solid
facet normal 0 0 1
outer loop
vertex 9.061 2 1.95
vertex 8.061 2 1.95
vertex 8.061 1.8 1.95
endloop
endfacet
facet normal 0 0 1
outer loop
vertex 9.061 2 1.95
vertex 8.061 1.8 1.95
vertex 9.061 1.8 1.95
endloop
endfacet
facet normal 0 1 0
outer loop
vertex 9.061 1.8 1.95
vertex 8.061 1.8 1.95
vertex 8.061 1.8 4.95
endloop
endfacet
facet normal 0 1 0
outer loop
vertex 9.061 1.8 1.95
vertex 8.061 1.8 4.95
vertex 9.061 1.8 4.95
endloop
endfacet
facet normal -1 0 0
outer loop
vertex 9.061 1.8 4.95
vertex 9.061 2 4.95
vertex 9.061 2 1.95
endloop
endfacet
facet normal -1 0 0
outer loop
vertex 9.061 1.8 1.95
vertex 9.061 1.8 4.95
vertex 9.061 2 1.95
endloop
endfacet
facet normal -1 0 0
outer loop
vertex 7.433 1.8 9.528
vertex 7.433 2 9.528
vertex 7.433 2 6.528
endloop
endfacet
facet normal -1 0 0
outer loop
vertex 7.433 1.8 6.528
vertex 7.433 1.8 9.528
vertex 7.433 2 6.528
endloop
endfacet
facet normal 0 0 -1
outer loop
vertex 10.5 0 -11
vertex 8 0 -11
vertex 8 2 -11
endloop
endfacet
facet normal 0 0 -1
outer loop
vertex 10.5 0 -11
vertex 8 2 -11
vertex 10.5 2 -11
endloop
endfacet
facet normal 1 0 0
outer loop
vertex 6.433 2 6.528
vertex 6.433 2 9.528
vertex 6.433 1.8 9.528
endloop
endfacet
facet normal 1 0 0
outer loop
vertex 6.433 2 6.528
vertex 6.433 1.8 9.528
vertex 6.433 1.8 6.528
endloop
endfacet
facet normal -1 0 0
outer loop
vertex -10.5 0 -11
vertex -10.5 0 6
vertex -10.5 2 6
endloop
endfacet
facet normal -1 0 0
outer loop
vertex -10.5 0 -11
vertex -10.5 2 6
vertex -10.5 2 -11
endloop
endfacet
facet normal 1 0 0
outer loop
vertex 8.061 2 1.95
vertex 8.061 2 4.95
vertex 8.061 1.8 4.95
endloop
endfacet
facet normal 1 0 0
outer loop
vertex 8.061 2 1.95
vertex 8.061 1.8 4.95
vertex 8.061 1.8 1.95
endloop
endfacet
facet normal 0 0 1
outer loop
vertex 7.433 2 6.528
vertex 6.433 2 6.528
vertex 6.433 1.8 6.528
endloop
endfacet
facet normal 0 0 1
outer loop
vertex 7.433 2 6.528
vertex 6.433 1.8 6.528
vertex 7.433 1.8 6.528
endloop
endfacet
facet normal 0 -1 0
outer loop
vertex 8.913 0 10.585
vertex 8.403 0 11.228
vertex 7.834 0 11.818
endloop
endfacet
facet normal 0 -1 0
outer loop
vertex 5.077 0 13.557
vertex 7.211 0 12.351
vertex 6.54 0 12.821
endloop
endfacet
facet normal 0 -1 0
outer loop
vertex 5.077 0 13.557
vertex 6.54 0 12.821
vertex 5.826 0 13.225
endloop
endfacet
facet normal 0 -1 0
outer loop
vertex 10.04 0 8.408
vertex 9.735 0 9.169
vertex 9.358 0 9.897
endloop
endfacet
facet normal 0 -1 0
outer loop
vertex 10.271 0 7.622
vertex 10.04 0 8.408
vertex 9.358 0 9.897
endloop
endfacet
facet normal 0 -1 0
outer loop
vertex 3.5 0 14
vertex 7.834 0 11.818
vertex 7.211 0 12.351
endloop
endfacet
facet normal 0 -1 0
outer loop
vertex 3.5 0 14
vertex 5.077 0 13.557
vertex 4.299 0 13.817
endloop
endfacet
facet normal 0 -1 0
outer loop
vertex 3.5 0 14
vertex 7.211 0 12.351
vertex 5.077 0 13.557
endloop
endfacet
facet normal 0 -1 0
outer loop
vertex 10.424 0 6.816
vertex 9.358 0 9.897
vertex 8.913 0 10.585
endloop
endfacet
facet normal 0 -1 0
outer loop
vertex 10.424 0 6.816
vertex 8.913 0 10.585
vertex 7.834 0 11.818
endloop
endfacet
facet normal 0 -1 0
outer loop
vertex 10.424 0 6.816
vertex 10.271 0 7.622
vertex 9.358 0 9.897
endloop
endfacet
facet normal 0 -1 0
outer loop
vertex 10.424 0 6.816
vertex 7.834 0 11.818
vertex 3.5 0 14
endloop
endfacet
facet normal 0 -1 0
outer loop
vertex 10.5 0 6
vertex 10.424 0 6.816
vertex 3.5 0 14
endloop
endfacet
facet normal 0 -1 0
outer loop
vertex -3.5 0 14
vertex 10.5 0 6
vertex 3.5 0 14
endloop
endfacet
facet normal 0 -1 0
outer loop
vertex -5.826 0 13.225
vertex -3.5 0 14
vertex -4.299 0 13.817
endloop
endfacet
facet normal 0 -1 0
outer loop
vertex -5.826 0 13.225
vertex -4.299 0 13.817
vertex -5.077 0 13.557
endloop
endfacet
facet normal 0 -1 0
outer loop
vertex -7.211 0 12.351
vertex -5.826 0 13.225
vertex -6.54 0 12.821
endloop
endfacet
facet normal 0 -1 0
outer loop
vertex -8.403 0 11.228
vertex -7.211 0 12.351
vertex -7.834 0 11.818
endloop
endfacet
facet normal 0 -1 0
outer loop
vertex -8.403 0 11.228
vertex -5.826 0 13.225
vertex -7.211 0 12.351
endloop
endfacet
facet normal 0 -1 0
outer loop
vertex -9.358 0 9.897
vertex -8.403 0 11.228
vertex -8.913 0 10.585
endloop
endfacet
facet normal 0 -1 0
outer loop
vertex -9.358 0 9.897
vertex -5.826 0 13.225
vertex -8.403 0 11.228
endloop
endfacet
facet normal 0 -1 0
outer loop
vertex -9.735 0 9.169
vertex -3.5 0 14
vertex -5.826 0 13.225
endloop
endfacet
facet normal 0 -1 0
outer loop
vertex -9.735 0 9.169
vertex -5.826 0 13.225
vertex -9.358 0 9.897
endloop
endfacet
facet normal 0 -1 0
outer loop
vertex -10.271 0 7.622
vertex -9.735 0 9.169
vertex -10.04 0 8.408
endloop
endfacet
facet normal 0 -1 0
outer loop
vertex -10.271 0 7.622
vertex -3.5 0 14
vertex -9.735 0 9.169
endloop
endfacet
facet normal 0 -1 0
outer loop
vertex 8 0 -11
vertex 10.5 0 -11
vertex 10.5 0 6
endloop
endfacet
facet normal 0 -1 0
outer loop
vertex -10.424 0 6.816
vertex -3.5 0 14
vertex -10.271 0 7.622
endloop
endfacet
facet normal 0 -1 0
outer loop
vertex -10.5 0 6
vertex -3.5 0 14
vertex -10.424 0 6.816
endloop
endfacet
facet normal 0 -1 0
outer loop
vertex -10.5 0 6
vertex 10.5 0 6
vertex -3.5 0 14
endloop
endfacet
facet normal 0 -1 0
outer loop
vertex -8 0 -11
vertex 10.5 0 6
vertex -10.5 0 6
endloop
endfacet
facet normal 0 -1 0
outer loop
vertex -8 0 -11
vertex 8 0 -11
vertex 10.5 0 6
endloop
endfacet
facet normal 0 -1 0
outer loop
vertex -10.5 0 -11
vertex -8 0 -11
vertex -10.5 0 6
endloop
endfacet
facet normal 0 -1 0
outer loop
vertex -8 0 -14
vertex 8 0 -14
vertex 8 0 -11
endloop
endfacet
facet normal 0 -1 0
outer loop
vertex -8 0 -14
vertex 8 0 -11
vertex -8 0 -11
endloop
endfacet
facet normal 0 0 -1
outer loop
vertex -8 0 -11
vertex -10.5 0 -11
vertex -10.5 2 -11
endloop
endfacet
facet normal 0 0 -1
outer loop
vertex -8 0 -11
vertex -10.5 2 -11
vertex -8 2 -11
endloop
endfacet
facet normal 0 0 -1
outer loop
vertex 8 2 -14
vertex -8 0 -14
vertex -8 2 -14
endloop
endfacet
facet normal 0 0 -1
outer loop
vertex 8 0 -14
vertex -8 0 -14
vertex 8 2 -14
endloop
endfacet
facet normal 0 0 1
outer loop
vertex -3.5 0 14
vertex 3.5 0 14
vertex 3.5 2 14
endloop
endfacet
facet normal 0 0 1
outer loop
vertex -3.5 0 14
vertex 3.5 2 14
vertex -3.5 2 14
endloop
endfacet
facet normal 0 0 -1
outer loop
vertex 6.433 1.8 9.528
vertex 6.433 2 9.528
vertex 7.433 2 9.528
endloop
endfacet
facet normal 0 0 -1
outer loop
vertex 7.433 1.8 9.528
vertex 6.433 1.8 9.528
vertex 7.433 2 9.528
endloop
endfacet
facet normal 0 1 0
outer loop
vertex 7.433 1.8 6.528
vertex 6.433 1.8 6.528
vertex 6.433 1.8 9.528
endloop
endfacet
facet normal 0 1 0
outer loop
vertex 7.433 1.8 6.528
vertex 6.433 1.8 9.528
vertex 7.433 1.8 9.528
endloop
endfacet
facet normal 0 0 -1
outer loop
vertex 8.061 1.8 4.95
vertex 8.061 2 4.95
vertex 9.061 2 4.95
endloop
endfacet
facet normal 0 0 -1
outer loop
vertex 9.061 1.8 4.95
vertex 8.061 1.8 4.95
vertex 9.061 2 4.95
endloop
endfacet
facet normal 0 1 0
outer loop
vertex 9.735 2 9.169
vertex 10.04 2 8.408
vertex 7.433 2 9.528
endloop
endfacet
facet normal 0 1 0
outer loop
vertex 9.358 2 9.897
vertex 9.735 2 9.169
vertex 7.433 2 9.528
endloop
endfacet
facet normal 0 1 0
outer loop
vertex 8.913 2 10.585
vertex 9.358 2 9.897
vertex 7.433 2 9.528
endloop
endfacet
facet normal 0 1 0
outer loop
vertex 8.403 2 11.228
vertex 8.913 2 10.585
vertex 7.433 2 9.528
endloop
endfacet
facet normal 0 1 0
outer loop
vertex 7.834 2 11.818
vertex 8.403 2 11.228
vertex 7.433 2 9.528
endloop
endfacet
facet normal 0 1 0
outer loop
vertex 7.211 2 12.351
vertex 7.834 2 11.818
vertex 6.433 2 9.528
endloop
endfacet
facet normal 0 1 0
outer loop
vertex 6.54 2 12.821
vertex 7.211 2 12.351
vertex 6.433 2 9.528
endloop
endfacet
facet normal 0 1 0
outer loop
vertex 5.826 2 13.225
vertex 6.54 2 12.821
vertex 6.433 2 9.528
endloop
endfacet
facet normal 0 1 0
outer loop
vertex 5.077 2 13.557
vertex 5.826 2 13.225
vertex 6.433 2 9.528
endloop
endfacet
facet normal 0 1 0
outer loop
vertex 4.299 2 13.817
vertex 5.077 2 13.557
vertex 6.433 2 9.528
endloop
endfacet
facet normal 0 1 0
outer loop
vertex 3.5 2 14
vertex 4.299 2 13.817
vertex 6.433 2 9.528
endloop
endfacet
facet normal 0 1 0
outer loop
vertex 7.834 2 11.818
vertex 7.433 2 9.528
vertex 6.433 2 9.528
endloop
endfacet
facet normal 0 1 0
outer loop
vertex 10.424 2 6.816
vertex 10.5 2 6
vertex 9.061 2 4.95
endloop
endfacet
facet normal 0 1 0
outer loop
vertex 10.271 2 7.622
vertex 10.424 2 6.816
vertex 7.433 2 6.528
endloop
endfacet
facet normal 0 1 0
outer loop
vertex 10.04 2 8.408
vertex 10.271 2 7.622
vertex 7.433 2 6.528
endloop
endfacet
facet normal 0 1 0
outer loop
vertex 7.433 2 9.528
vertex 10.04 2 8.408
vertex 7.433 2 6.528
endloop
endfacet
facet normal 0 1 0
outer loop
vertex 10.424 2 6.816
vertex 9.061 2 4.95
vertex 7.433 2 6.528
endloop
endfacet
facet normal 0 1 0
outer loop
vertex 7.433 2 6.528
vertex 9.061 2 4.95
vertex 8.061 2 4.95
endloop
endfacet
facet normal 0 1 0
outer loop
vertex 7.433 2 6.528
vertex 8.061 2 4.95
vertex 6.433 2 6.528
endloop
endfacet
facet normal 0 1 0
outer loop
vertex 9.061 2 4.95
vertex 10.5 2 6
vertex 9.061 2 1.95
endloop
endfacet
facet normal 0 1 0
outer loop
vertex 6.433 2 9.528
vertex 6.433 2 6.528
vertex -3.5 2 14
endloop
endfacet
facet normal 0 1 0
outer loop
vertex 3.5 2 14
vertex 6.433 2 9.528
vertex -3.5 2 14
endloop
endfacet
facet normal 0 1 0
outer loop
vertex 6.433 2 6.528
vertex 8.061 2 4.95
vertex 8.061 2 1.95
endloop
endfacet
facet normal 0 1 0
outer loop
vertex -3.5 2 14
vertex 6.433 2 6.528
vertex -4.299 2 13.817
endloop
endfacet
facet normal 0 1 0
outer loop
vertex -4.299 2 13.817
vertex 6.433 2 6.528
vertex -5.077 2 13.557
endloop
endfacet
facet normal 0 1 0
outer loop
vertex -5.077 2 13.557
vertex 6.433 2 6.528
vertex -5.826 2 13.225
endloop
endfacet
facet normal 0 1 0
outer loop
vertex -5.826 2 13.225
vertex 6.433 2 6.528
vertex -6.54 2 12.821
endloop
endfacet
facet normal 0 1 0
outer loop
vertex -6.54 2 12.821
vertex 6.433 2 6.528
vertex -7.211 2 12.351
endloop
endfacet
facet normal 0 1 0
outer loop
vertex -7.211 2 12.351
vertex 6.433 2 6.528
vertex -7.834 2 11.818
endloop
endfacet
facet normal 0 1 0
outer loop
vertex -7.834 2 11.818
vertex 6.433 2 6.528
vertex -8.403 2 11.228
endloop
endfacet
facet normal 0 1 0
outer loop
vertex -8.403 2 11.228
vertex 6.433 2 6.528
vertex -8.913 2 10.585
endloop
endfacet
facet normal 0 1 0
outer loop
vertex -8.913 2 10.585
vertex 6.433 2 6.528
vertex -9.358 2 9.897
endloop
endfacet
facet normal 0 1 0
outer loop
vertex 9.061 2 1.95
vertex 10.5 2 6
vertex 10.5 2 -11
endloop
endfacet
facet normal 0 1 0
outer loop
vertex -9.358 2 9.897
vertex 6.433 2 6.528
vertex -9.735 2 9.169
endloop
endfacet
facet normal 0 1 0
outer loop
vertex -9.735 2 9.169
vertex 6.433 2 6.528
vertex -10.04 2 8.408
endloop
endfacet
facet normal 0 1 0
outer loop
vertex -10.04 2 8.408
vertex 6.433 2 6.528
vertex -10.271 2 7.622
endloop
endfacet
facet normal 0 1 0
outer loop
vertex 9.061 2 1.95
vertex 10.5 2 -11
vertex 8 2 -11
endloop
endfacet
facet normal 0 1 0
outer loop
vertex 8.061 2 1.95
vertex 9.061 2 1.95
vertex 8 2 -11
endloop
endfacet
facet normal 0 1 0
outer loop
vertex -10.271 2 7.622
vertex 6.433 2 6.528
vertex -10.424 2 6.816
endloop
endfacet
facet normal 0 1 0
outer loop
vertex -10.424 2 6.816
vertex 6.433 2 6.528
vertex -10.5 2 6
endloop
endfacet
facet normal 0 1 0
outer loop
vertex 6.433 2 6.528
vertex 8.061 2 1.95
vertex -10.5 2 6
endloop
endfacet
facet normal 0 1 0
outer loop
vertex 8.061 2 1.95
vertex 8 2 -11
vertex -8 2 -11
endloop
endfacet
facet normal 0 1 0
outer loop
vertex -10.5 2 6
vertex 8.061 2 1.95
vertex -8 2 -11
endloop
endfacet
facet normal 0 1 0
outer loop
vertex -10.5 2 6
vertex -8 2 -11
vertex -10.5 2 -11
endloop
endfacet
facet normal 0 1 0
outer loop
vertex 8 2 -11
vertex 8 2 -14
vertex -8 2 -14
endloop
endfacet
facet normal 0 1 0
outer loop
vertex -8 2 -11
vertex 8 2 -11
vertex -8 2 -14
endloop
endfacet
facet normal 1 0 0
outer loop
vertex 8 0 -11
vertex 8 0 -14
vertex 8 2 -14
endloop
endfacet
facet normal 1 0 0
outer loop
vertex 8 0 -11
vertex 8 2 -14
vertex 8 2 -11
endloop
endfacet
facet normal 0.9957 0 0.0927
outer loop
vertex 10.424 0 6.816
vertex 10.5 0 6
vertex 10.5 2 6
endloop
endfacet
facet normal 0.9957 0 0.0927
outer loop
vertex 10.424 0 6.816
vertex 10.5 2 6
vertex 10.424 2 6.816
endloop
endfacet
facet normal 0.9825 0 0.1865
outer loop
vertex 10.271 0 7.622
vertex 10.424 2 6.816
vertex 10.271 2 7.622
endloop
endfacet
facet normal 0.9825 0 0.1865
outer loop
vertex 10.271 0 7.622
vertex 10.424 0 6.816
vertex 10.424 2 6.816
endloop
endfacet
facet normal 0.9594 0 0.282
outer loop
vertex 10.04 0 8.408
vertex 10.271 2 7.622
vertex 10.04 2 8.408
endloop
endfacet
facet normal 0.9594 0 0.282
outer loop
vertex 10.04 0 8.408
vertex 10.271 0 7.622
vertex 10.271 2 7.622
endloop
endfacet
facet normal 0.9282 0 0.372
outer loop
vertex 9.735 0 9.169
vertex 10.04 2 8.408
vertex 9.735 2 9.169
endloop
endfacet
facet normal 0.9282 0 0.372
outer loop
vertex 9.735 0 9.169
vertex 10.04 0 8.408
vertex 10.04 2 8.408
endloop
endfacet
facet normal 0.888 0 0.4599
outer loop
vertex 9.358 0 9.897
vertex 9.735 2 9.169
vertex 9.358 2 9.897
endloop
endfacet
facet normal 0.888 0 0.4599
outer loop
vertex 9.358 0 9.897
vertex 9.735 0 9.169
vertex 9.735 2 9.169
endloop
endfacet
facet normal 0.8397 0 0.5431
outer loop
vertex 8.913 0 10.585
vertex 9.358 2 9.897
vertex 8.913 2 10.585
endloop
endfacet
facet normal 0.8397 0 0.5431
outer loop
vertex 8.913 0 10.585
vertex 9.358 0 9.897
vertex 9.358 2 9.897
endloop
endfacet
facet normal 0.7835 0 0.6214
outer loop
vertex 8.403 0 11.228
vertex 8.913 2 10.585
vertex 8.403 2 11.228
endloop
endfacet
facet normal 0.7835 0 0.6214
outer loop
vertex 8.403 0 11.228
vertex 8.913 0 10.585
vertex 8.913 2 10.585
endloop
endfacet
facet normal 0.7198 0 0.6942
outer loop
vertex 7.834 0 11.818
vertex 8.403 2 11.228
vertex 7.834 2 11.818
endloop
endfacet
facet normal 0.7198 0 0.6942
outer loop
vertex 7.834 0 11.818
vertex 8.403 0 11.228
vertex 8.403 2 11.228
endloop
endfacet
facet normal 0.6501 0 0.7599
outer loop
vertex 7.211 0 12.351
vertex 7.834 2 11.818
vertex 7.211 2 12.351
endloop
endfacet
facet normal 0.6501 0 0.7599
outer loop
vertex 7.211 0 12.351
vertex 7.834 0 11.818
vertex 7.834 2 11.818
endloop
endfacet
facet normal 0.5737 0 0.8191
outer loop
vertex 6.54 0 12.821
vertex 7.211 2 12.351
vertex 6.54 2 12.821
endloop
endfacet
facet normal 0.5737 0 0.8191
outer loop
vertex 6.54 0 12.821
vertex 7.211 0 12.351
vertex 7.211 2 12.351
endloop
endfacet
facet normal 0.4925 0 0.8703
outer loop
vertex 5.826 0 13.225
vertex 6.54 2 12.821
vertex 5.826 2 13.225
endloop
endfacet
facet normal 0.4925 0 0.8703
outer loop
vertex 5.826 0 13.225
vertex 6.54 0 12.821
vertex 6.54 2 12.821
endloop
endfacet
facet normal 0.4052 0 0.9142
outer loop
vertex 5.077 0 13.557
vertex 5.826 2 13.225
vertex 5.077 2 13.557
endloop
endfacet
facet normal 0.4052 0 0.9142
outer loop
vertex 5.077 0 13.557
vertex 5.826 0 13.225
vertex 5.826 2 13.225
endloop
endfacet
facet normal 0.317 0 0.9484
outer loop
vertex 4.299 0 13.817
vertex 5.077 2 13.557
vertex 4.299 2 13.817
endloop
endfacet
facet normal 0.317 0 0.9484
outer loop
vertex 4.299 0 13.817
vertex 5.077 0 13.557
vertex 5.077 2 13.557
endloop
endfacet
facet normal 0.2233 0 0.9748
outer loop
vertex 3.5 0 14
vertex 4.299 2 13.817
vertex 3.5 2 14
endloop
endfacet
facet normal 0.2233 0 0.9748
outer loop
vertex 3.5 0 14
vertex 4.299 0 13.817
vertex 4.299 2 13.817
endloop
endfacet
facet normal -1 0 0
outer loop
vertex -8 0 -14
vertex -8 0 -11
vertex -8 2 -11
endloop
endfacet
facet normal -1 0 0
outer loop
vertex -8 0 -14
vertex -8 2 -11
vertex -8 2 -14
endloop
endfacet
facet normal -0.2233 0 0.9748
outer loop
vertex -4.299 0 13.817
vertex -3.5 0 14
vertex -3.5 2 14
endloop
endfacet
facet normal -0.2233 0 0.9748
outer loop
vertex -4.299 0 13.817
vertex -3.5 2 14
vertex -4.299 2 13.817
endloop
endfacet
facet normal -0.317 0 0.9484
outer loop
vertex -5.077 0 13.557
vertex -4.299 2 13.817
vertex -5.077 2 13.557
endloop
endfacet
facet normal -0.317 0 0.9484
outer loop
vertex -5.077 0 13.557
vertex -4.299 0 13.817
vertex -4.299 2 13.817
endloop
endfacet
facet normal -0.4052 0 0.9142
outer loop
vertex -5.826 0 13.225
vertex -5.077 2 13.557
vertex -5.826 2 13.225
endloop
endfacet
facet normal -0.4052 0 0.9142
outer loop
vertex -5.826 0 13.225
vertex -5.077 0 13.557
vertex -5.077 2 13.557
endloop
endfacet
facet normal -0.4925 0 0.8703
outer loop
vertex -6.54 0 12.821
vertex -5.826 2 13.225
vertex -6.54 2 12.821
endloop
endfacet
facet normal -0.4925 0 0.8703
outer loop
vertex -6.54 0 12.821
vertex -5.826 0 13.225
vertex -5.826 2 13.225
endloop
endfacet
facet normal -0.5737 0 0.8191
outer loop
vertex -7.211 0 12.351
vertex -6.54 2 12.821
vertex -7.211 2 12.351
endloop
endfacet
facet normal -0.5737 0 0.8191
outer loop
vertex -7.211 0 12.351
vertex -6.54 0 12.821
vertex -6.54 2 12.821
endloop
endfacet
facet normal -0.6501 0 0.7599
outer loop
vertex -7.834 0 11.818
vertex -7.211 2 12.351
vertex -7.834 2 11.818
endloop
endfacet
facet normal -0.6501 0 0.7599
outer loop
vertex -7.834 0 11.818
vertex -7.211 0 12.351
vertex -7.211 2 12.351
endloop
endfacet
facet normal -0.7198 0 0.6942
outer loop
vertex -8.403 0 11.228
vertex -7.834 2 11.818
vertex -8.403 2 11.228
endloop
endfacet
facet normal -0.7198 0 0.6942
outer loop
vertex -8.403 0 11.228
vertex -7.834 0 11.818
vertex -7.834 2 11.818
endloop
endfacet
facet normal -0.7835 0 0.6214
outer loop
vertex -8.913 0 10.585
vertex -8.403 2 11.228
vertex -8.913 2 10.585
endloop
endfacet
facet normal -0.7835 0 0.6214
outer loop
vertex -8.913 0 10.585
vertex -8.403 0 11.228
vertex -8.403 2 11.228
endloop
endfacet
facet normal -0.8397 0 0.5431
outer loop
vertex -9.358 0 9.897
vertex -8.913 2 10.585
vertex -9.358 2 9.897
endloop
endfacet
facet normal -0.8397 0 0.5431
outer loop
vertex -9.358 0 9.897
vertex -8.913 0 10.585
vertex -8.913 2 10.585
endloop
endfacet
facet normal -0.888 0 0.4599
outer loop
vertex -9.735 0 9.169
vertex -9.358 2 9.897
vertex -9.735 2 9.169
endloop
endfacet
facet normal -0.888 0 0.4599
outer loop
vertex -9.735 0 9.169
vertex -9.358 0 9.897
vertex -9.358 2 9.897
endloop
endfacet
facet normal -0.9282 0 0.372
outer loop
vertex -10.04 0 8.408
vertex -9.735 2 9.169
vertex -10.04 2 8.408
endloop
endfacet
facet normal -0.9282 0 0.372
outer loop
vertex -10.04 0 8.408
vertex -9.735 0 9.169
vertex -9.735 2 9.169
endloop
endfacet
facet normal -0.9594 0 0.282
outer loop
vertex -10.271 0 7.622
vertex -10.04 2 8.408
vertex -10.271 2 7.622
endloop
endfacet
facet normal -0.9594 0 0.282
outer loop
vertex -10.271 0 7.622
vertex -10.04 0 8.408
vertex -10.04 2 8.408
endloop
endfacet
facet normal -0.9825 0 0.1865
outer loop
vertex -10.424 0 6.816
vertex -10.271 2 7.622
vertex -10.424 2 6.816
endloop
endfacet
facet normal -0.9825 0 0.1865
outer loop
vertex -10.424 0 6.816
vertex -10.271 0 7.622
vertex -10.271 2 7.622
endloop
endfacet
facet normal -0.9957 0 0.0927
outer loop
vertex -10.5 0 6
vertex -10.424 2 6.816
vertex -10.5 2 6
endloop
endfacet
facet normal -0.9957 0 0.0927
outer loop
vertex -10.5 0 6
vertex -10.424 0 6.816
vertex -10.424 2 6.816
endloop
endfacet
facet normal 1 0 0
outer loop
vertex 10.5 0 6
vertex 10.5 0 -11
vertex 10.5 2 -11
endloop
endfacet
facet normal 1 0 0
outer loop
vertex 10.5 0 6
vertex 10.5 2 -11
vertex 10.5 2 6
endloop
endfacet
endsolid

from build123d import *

# Parameters (mm, degrees)
EXTRUDE_1_DEPTH     = 2
SKETCH_2_W          = 1
SKETCH_2_H          = 3
CUT_EXTRUDE_1_DEPTH = 0.2


with BuildPart() as part:
    # 草图1 → 凸台-拉伸1 (new body)
    with BuildSketch(Plane(origin=(0, 0, 0), x_dir=(1, 0, 0), z_dir=(0, 1, 0))):
        with BuildLine():
            Line((-8, 14), (8, 14))
            Line((8, 14), (8, 11))
            Line((8, 11), (10.5, 11))
            Line((10.5, 11), (10.5, -6))
            ThreePointArc((10.5, -6), (8.403124237, -11.227733708), (3.5, -14))
            Line((3.5, -14), (-3.5, -14))
            ThreePointArc((-3.5, -14), (-8.403124237, -11.227733708), (-10.5, -6))
            Line((-10.5, -6), (-10.5, 11))
            Line((-10.5, 11), (-8, 11))
            Line((-8, 11), (-8, 14))
        make_face()
    extrude(amount=EXTRUDE_1_DEPTH)

    # 草图2 → 切除-拉伸1 (cut)
    with BuildSketch(Plane(origin=(0, 2, 0), x_dir=(1, 0, 0), z_dir=(0, 1, 0))):
        with Locations((8.561436861, -3.449742869)):
            Rectangle(SKETCH_2_W, SKETCH_2_H)
        with Locations((6.933076326, -8.027614823)):
            Rectangle(SKETCH_2_W, SKETCH_2_H)
    extrude(amount=-CUT_EXTRUDE_1_DEPTH, mode=Mode.SUBTRACT)


solid = part.part
